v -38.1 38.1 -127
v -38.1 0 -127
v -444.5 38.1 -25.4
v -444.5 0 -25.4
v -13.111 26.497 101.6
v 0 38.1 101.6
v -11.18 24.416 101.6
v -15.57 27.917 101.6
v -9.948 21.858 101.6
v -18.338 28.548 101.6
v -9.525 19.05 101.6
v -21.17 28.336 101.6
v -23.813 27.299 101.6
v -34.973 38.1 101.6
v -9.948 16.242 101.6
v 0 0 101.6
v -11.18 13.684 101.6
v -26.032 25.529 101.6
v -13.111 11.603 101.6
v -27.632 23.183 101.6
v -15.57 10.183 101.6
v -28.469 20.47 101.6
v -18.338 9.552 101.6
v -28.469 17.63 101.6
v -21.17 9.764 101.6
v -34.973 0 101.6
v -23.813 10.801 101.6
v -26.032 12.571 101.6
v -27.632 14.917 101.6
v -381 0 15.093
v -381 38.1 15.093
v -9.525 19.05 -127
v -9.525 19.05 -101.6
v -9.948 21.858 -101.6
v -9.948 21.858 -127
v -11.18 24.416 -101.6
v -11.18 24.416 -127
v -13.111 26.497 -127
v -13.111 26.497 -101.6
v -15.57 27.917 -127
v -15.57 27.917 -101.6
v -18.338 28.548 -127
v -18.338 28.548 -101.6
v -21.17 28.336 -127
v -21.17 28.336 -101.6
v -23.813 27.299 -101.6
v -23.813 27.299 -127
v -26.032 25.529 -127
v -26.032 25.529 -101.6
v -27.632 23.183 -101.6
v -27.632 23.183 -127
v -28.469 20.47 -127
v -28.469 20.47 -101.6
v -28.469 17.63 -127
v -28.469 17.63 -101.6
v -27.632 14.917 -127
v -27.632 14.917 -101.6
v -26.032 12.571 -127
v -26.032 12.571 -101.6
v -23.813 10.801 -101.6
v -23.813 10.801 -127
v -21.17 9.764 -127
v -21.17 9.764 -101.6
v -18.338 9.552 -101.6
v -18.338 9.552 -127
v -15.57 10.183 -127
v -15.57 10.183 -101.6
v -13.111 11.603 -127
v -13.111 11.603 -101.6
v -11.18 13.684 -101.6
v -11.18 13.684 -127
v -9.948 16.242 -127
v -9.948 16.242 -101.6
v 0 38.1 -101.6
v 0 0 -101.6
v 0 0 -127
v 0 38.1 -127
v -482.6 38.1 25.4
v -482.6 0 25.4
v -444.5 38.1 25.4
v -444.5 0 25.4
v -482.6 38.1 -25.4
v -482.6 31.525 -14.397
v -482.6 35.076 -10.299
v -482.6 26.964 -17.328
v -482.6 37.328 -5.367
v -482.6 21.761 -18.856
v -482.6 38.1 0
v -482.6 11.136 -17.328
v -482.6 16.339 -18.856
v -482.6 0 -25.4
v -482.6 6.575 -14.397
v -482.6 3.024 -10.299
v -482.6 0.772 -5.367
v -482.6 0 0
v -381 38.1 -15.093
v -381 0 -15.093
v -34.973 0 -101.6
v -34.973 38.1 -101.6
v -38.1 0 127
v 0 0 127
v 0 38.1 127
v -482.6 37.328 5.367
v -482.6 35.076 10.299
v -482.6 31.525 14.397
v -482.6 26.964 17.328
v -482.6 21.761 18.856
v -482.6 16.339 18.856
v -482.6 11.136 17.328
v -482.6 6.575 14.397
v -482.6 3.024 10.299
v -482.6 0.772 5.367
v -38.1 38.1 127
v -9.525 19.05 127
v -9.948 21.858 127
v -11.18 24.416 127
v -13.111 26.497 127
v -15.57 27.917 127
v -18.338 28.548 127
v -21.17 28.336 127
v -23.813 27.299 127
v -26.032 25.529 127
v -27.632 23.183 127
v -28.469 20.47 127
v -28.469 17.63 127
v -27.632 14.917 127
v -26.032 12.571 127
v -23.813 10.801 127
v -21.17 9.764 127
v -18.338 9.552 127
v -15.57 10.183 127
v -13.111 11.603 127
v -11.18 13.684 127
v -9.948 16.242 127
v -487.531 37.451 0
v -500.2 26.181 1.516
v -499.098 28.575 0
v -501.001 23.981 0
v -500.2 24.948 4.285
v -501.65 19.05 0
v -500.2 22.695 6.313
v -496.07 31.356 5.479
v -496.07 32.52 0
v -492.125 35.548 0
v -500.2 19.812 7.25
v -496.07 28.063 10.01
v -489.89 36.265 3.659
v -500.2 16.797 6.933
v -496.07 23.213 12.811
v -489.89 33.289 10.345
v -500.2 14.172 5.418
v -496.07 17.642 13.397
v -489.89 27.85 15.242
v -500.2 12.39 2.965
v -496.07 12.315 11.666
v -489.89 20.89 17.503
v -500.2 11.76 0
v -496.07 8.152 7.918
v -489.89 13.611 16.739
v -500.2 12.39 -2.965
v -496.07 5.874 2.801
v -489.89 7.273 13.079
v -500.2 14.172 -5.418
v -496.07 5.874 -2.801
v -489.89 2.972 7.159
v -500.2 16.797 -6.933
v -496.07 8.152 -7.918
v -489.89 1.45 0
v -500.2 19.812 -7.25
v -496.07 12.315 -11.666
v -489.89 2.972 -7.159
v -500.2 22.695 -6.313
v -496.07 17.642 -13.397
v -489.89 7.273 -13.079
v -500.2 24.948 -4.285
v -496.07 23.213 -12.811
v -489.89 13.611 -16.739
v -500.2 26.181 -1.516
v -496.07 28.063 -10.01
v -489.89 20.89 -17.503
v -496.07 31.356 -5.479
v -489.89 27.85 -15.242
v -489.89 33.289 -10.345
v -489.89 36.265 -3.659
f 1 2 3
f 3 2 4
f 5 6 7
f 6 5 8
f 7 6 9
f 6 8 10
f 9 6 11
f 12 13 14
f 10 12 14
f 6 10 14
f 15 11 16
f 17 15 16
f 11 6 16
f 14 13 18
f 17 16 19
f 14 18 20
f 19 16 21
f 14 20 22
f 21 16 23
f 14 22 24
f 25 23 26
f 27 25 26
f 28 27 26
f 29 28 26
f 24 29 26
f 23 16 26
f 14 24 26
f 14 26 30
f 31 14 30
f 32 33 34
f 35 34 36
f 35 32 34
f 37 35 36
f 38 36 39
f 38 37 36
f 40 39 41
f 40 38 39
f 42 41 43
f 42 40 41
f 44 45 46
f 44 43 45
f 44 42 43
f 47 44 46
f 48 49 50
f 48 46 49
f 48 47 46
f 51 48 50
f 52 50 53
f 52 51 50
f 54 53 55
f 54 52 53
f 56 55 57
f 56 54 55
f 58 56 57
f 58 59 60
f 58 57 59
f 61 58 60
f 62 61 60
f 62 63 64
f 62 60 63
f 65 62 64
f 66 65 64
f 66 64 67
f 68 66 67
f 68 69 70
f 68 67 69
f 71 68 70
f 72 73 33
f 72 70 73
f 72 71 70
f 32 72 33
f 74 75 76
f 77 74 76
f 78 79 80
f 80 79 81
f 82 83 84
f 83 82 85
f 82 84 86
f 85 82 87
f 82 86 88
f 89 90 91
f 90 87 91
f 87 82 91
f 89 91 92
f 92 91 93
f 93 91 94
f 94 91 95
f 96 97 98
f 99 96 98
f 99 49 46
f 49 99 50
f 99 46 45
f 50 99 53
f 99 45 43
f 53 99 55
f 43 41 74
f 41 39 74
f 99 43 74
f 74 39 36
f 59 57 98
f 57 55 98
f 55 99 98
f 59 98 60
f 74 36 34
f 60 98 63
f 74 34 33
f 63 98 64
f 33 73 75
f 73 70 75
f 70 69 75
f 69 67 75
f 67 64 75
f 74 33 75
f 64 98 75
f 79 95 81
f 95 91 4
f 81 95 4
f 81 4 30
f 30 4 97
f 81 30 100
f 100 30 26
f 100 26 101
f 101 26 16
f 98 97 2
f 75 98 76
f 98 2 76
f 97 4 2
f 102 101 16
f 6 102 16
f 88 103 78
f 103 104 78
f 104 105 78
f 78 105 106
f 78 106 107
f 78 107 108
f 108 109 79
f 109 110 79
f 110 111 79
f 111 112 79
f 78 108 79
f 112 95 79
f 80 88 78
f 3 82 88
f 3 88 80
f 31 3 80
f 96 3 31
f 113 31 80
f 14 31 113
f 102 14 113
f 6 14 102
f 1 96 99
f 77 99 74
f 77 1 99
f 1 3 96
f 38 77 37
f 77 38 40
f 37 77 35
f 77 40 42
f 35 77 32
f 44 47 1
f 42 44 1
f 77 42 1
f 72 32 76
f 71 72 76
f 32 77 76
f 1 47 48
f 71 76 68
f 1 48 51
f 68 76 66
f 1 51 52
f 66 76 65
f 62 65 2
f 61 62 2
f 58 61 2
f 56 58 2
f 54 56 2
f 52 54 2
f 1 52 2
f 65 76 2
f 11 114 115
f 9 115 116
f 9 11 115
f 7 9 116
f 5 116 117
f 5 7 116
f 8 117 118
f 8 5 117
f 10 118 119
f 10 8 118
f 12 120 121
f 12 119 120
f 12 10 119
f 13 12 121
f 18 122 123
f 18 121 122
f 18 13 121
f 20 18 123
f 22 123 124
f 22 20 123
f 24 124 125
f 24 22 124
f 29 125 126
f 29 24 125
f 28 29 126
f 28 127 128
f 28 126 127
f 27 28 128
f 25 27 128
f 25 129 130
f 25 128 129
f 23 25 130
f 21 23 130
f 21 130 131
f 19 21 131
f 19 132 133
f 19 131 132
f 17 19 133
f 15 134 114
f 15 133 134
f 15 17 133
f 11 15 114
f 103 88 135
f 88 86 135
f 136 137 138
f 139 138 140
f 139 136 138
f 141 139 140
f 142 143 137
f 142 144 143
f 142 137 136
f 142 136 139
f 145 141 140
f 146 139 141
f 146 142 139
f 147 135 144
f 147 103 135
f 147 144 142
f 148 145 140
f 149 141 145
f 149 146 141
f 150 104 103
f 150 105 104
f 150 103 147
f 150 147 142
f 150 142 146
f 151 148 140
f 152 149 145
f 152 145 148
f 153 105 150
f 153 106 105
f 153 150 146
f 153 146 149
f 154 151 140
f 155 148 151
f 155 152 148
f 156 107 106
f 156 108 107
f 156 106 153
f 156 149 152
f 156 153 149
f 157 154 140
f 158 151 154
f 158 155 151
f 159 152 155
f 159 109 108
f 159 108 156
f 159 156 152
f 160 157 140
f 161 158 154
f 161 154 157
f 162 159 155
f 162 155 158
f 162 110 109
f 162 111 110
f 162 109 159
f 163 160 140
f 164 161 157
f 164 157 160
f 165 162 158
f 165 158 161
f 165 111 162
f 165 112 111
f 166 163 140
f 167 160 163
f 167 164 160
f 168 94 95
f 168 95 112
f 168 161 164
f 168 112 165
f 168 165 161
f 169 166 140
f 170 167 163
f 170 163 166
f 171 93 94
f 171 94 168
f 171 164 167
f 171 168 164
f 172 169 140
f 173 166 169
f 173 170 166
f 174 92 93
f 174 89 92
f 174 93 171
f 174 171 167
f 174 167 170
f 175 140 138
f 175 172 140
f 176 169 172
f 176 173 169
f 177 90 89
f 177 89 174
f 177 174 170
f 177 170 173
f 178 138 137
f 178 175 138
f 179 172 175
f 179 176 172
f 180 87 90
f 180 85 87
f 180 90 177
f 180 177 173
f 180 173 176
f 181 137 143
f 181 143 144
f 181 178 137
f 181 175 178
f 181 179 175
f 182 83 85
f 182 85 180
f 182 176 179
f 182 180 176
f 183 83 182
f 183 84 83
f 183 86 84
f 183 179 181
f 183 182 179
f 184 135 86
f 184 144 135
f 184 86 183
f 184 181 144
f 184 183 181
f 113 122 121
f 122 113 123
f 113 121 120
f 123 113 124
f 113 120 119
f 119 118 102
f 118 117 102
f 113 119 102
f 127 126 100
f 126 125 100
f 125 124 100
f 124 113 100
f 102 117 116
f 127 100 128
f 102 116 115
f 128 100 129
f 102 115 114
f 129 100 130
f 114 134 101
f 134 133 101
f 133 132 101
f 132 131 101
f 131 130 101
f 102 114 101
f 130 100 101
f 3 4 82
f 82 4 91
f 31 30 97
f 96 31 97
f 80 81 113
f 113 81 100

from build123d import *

# Parameters (mm, degrees)
BOSS_EXTRUDE1_DEPTH     = 38.1
CUT_EXTRUDE1_DEPTH      = 564.578151191
CUT_EXTRUDE1_DEPTH_BACK = 564.578151191
SKETCH3_R               = 9.525


with BuildPart() as part:
    # Sketch1 → Boss-Extrude1 (new body)
    with BuildSketch(Plane(origin=(0, 0, 0), x_dir=(1, 0, 0), z_dir=(0, 1, 0))):
        Polygon((-38.1, 127), (-444.5, 25.4), (-482.6, 25.4), (-482.6, -25.4), (-444.5, -25.4), (-38.1, -127), (0, -127), (0, -101.6), (-34.973117109, -101.6), (-381, -15.093279277), (-381, 15.093279277), (-34.973117109, 101.6), (0, 101.6), (0, 127), align=None)
    extrude(amount=BOSS_EXTRUDE1_DEPTH)


with BuildPart() as revolve1_tool:
    # Sketch2 → Revolve1 (revolve)
    with BuildSketch(Plane.XY):
        with BuildLine():
            Line((-482.6, 0), (-482.6, 38.1))
            ThreePointArc((-482.6, 38.1), (-501.65, 19.05), (-482.6, 0))
        make_face()
    revolve(axis=Axis((-482.6, 38.1, 0), (0, -1, 0)))


with BuildPart() as part_1:
    add(part.part)


with BuildPart() as part_2:
    # Revolve1: joined with revolve1_tool
    add(part_1.part.fuse(revolve1_tool.part, tol=0.00001))

    # Sketch3 → Cut-Extrude1 (cut, two sides: drawn at the far end of the back side and taken through both)
    with BuildSketch(Plane.XY.offset(127).offset(-CUT_EXTRUDE1_DEPTH_BACK)):
        with Locations((-19.05, 19.05)):
            Circle(SKETCH3_R)
    extrude(amount=CUT_EXTRUDE1_DEPTH + CUT_EXTRUDE1_DEPTH_BACK, mode=Mode.SUBTRACT)


solid = part_2.part
